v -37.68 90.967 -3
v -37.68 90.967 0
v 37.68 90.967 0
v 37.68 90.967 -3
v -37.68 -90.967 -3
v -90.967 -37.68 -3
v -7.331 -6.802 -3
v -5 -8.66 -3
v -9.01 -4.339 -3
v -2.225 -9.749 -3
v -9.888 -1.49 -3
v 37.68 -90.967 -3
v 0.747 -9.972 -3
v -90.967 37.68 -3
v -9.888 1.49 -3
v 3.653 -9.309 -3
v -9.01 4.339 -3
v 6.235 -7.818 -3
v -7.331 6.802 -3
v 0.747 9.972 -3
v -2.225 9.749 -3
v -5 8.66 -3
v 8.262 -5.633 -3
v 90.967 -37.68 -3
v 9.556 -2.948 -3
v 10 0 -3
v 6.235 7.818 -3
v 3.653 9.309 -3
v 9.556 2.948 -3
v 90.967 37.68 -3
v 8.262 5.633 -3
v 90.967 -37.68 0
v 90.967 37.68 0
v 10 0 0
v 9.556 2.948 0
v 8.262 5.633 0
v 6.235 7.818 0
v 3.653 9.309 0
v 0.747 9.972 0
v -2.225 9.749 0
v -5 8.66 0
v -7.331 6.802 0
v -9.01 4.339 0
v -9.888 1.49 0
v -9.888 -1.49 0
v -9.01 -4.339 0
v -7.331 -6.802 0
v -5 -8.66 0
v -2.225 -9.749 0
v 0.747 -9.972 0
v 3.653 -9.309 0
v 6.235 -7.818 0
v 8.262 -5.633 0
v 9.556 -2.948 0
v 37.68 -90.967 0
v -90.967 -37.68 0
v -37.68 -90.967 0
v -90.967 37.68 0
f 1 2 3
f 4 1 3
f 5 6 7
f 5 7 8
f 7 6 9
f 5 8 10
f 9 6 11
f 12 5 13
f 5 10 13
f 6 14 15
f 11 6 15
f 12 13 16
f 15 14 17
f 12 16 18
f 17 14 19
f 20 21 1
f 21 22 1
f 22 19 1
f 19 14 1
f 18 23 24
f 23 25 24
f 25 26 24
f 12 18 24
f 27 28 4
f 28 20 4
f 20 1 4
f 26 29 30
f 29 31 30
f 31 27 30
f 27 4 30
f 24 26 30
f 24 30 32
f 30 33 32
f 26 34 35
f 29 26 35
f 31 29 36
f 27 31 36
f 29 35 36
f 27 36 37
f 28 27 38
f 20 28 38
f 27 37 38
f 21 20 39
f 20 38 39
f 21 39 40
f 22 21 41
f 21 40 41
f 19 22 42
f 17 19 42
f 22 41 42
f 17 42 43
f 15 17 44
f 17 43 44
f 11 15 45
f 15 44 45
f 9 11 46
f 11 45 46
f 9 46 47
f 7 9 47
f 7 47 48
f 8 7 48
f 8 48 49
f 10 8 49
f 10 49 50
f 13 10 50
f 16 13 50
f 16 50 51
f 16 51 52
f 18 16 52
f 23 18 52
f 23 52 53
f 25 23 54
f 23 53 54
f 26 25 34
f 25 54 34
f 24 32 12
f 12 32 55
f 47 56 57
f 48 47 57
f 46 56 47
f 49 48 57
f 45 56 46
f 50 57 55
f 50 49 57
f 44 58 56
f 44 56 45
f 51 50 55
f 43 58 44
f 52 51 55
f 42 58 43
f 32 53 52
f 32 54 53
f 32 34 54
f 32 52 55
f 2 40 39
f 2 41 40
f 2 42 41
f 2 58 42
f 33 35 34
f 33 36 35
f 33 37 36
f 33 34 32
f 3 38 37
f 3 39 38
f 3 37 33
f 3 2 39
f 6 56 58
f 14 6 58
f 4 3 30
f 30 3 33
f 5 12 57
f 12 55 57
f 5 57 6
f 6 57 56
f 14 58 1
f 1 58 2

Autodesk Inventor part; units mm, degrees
ref_plane "우측면도" through (0, 0, 0) normal (1, 0, 0) x (0, 1, 0)
ref_plane "평면도" through (0, 0, 0) normal (0, 1, 0) x (-1, 0, 0)
ref_plane "정면도" through (0, 0, 0) normal (0, 0, 1) x (1, 0, 0)
sketch "스케치1" plane through (0, 0, 0) normal (0, 0, 1) x (1, 0, 0)
  circle A0 centre (0, 0) radius 98.462
  line L0 (37.6798, 90.967) -> (90.967, 37.6798)
  line L1 (90.967, 37.6798) -> (90.967, -37.6798)
  line L2 (90.967, -37.6798) -> (37.6798, -90.967)
  line L3 (37.6798, -90.967) -> (-37.6798, -90.967)
  line L4 (-37.6798, -90.967) -> (-90.967, -37.6798)
  line L5 (-90.967, -37.6798) -> (-90.967, 37.6798)
  line L6 (-90.967, 37.6798) -> (-37.6798, 90.967)
  line L7 (-37.6798, 90.967) -> (37.6798, 90.967)
  circle A1 centre (0, 0) radius 10
  dimension "d16" = 196.924
  dimension "d17" = 20
extrude "돌출1" add sketch "스케치1" against normal blind 3 contours L1 L2 L3 L4 L5 L6 L7 L0
properties part number "프레임위밑판" material "PLA 플라스틱"
